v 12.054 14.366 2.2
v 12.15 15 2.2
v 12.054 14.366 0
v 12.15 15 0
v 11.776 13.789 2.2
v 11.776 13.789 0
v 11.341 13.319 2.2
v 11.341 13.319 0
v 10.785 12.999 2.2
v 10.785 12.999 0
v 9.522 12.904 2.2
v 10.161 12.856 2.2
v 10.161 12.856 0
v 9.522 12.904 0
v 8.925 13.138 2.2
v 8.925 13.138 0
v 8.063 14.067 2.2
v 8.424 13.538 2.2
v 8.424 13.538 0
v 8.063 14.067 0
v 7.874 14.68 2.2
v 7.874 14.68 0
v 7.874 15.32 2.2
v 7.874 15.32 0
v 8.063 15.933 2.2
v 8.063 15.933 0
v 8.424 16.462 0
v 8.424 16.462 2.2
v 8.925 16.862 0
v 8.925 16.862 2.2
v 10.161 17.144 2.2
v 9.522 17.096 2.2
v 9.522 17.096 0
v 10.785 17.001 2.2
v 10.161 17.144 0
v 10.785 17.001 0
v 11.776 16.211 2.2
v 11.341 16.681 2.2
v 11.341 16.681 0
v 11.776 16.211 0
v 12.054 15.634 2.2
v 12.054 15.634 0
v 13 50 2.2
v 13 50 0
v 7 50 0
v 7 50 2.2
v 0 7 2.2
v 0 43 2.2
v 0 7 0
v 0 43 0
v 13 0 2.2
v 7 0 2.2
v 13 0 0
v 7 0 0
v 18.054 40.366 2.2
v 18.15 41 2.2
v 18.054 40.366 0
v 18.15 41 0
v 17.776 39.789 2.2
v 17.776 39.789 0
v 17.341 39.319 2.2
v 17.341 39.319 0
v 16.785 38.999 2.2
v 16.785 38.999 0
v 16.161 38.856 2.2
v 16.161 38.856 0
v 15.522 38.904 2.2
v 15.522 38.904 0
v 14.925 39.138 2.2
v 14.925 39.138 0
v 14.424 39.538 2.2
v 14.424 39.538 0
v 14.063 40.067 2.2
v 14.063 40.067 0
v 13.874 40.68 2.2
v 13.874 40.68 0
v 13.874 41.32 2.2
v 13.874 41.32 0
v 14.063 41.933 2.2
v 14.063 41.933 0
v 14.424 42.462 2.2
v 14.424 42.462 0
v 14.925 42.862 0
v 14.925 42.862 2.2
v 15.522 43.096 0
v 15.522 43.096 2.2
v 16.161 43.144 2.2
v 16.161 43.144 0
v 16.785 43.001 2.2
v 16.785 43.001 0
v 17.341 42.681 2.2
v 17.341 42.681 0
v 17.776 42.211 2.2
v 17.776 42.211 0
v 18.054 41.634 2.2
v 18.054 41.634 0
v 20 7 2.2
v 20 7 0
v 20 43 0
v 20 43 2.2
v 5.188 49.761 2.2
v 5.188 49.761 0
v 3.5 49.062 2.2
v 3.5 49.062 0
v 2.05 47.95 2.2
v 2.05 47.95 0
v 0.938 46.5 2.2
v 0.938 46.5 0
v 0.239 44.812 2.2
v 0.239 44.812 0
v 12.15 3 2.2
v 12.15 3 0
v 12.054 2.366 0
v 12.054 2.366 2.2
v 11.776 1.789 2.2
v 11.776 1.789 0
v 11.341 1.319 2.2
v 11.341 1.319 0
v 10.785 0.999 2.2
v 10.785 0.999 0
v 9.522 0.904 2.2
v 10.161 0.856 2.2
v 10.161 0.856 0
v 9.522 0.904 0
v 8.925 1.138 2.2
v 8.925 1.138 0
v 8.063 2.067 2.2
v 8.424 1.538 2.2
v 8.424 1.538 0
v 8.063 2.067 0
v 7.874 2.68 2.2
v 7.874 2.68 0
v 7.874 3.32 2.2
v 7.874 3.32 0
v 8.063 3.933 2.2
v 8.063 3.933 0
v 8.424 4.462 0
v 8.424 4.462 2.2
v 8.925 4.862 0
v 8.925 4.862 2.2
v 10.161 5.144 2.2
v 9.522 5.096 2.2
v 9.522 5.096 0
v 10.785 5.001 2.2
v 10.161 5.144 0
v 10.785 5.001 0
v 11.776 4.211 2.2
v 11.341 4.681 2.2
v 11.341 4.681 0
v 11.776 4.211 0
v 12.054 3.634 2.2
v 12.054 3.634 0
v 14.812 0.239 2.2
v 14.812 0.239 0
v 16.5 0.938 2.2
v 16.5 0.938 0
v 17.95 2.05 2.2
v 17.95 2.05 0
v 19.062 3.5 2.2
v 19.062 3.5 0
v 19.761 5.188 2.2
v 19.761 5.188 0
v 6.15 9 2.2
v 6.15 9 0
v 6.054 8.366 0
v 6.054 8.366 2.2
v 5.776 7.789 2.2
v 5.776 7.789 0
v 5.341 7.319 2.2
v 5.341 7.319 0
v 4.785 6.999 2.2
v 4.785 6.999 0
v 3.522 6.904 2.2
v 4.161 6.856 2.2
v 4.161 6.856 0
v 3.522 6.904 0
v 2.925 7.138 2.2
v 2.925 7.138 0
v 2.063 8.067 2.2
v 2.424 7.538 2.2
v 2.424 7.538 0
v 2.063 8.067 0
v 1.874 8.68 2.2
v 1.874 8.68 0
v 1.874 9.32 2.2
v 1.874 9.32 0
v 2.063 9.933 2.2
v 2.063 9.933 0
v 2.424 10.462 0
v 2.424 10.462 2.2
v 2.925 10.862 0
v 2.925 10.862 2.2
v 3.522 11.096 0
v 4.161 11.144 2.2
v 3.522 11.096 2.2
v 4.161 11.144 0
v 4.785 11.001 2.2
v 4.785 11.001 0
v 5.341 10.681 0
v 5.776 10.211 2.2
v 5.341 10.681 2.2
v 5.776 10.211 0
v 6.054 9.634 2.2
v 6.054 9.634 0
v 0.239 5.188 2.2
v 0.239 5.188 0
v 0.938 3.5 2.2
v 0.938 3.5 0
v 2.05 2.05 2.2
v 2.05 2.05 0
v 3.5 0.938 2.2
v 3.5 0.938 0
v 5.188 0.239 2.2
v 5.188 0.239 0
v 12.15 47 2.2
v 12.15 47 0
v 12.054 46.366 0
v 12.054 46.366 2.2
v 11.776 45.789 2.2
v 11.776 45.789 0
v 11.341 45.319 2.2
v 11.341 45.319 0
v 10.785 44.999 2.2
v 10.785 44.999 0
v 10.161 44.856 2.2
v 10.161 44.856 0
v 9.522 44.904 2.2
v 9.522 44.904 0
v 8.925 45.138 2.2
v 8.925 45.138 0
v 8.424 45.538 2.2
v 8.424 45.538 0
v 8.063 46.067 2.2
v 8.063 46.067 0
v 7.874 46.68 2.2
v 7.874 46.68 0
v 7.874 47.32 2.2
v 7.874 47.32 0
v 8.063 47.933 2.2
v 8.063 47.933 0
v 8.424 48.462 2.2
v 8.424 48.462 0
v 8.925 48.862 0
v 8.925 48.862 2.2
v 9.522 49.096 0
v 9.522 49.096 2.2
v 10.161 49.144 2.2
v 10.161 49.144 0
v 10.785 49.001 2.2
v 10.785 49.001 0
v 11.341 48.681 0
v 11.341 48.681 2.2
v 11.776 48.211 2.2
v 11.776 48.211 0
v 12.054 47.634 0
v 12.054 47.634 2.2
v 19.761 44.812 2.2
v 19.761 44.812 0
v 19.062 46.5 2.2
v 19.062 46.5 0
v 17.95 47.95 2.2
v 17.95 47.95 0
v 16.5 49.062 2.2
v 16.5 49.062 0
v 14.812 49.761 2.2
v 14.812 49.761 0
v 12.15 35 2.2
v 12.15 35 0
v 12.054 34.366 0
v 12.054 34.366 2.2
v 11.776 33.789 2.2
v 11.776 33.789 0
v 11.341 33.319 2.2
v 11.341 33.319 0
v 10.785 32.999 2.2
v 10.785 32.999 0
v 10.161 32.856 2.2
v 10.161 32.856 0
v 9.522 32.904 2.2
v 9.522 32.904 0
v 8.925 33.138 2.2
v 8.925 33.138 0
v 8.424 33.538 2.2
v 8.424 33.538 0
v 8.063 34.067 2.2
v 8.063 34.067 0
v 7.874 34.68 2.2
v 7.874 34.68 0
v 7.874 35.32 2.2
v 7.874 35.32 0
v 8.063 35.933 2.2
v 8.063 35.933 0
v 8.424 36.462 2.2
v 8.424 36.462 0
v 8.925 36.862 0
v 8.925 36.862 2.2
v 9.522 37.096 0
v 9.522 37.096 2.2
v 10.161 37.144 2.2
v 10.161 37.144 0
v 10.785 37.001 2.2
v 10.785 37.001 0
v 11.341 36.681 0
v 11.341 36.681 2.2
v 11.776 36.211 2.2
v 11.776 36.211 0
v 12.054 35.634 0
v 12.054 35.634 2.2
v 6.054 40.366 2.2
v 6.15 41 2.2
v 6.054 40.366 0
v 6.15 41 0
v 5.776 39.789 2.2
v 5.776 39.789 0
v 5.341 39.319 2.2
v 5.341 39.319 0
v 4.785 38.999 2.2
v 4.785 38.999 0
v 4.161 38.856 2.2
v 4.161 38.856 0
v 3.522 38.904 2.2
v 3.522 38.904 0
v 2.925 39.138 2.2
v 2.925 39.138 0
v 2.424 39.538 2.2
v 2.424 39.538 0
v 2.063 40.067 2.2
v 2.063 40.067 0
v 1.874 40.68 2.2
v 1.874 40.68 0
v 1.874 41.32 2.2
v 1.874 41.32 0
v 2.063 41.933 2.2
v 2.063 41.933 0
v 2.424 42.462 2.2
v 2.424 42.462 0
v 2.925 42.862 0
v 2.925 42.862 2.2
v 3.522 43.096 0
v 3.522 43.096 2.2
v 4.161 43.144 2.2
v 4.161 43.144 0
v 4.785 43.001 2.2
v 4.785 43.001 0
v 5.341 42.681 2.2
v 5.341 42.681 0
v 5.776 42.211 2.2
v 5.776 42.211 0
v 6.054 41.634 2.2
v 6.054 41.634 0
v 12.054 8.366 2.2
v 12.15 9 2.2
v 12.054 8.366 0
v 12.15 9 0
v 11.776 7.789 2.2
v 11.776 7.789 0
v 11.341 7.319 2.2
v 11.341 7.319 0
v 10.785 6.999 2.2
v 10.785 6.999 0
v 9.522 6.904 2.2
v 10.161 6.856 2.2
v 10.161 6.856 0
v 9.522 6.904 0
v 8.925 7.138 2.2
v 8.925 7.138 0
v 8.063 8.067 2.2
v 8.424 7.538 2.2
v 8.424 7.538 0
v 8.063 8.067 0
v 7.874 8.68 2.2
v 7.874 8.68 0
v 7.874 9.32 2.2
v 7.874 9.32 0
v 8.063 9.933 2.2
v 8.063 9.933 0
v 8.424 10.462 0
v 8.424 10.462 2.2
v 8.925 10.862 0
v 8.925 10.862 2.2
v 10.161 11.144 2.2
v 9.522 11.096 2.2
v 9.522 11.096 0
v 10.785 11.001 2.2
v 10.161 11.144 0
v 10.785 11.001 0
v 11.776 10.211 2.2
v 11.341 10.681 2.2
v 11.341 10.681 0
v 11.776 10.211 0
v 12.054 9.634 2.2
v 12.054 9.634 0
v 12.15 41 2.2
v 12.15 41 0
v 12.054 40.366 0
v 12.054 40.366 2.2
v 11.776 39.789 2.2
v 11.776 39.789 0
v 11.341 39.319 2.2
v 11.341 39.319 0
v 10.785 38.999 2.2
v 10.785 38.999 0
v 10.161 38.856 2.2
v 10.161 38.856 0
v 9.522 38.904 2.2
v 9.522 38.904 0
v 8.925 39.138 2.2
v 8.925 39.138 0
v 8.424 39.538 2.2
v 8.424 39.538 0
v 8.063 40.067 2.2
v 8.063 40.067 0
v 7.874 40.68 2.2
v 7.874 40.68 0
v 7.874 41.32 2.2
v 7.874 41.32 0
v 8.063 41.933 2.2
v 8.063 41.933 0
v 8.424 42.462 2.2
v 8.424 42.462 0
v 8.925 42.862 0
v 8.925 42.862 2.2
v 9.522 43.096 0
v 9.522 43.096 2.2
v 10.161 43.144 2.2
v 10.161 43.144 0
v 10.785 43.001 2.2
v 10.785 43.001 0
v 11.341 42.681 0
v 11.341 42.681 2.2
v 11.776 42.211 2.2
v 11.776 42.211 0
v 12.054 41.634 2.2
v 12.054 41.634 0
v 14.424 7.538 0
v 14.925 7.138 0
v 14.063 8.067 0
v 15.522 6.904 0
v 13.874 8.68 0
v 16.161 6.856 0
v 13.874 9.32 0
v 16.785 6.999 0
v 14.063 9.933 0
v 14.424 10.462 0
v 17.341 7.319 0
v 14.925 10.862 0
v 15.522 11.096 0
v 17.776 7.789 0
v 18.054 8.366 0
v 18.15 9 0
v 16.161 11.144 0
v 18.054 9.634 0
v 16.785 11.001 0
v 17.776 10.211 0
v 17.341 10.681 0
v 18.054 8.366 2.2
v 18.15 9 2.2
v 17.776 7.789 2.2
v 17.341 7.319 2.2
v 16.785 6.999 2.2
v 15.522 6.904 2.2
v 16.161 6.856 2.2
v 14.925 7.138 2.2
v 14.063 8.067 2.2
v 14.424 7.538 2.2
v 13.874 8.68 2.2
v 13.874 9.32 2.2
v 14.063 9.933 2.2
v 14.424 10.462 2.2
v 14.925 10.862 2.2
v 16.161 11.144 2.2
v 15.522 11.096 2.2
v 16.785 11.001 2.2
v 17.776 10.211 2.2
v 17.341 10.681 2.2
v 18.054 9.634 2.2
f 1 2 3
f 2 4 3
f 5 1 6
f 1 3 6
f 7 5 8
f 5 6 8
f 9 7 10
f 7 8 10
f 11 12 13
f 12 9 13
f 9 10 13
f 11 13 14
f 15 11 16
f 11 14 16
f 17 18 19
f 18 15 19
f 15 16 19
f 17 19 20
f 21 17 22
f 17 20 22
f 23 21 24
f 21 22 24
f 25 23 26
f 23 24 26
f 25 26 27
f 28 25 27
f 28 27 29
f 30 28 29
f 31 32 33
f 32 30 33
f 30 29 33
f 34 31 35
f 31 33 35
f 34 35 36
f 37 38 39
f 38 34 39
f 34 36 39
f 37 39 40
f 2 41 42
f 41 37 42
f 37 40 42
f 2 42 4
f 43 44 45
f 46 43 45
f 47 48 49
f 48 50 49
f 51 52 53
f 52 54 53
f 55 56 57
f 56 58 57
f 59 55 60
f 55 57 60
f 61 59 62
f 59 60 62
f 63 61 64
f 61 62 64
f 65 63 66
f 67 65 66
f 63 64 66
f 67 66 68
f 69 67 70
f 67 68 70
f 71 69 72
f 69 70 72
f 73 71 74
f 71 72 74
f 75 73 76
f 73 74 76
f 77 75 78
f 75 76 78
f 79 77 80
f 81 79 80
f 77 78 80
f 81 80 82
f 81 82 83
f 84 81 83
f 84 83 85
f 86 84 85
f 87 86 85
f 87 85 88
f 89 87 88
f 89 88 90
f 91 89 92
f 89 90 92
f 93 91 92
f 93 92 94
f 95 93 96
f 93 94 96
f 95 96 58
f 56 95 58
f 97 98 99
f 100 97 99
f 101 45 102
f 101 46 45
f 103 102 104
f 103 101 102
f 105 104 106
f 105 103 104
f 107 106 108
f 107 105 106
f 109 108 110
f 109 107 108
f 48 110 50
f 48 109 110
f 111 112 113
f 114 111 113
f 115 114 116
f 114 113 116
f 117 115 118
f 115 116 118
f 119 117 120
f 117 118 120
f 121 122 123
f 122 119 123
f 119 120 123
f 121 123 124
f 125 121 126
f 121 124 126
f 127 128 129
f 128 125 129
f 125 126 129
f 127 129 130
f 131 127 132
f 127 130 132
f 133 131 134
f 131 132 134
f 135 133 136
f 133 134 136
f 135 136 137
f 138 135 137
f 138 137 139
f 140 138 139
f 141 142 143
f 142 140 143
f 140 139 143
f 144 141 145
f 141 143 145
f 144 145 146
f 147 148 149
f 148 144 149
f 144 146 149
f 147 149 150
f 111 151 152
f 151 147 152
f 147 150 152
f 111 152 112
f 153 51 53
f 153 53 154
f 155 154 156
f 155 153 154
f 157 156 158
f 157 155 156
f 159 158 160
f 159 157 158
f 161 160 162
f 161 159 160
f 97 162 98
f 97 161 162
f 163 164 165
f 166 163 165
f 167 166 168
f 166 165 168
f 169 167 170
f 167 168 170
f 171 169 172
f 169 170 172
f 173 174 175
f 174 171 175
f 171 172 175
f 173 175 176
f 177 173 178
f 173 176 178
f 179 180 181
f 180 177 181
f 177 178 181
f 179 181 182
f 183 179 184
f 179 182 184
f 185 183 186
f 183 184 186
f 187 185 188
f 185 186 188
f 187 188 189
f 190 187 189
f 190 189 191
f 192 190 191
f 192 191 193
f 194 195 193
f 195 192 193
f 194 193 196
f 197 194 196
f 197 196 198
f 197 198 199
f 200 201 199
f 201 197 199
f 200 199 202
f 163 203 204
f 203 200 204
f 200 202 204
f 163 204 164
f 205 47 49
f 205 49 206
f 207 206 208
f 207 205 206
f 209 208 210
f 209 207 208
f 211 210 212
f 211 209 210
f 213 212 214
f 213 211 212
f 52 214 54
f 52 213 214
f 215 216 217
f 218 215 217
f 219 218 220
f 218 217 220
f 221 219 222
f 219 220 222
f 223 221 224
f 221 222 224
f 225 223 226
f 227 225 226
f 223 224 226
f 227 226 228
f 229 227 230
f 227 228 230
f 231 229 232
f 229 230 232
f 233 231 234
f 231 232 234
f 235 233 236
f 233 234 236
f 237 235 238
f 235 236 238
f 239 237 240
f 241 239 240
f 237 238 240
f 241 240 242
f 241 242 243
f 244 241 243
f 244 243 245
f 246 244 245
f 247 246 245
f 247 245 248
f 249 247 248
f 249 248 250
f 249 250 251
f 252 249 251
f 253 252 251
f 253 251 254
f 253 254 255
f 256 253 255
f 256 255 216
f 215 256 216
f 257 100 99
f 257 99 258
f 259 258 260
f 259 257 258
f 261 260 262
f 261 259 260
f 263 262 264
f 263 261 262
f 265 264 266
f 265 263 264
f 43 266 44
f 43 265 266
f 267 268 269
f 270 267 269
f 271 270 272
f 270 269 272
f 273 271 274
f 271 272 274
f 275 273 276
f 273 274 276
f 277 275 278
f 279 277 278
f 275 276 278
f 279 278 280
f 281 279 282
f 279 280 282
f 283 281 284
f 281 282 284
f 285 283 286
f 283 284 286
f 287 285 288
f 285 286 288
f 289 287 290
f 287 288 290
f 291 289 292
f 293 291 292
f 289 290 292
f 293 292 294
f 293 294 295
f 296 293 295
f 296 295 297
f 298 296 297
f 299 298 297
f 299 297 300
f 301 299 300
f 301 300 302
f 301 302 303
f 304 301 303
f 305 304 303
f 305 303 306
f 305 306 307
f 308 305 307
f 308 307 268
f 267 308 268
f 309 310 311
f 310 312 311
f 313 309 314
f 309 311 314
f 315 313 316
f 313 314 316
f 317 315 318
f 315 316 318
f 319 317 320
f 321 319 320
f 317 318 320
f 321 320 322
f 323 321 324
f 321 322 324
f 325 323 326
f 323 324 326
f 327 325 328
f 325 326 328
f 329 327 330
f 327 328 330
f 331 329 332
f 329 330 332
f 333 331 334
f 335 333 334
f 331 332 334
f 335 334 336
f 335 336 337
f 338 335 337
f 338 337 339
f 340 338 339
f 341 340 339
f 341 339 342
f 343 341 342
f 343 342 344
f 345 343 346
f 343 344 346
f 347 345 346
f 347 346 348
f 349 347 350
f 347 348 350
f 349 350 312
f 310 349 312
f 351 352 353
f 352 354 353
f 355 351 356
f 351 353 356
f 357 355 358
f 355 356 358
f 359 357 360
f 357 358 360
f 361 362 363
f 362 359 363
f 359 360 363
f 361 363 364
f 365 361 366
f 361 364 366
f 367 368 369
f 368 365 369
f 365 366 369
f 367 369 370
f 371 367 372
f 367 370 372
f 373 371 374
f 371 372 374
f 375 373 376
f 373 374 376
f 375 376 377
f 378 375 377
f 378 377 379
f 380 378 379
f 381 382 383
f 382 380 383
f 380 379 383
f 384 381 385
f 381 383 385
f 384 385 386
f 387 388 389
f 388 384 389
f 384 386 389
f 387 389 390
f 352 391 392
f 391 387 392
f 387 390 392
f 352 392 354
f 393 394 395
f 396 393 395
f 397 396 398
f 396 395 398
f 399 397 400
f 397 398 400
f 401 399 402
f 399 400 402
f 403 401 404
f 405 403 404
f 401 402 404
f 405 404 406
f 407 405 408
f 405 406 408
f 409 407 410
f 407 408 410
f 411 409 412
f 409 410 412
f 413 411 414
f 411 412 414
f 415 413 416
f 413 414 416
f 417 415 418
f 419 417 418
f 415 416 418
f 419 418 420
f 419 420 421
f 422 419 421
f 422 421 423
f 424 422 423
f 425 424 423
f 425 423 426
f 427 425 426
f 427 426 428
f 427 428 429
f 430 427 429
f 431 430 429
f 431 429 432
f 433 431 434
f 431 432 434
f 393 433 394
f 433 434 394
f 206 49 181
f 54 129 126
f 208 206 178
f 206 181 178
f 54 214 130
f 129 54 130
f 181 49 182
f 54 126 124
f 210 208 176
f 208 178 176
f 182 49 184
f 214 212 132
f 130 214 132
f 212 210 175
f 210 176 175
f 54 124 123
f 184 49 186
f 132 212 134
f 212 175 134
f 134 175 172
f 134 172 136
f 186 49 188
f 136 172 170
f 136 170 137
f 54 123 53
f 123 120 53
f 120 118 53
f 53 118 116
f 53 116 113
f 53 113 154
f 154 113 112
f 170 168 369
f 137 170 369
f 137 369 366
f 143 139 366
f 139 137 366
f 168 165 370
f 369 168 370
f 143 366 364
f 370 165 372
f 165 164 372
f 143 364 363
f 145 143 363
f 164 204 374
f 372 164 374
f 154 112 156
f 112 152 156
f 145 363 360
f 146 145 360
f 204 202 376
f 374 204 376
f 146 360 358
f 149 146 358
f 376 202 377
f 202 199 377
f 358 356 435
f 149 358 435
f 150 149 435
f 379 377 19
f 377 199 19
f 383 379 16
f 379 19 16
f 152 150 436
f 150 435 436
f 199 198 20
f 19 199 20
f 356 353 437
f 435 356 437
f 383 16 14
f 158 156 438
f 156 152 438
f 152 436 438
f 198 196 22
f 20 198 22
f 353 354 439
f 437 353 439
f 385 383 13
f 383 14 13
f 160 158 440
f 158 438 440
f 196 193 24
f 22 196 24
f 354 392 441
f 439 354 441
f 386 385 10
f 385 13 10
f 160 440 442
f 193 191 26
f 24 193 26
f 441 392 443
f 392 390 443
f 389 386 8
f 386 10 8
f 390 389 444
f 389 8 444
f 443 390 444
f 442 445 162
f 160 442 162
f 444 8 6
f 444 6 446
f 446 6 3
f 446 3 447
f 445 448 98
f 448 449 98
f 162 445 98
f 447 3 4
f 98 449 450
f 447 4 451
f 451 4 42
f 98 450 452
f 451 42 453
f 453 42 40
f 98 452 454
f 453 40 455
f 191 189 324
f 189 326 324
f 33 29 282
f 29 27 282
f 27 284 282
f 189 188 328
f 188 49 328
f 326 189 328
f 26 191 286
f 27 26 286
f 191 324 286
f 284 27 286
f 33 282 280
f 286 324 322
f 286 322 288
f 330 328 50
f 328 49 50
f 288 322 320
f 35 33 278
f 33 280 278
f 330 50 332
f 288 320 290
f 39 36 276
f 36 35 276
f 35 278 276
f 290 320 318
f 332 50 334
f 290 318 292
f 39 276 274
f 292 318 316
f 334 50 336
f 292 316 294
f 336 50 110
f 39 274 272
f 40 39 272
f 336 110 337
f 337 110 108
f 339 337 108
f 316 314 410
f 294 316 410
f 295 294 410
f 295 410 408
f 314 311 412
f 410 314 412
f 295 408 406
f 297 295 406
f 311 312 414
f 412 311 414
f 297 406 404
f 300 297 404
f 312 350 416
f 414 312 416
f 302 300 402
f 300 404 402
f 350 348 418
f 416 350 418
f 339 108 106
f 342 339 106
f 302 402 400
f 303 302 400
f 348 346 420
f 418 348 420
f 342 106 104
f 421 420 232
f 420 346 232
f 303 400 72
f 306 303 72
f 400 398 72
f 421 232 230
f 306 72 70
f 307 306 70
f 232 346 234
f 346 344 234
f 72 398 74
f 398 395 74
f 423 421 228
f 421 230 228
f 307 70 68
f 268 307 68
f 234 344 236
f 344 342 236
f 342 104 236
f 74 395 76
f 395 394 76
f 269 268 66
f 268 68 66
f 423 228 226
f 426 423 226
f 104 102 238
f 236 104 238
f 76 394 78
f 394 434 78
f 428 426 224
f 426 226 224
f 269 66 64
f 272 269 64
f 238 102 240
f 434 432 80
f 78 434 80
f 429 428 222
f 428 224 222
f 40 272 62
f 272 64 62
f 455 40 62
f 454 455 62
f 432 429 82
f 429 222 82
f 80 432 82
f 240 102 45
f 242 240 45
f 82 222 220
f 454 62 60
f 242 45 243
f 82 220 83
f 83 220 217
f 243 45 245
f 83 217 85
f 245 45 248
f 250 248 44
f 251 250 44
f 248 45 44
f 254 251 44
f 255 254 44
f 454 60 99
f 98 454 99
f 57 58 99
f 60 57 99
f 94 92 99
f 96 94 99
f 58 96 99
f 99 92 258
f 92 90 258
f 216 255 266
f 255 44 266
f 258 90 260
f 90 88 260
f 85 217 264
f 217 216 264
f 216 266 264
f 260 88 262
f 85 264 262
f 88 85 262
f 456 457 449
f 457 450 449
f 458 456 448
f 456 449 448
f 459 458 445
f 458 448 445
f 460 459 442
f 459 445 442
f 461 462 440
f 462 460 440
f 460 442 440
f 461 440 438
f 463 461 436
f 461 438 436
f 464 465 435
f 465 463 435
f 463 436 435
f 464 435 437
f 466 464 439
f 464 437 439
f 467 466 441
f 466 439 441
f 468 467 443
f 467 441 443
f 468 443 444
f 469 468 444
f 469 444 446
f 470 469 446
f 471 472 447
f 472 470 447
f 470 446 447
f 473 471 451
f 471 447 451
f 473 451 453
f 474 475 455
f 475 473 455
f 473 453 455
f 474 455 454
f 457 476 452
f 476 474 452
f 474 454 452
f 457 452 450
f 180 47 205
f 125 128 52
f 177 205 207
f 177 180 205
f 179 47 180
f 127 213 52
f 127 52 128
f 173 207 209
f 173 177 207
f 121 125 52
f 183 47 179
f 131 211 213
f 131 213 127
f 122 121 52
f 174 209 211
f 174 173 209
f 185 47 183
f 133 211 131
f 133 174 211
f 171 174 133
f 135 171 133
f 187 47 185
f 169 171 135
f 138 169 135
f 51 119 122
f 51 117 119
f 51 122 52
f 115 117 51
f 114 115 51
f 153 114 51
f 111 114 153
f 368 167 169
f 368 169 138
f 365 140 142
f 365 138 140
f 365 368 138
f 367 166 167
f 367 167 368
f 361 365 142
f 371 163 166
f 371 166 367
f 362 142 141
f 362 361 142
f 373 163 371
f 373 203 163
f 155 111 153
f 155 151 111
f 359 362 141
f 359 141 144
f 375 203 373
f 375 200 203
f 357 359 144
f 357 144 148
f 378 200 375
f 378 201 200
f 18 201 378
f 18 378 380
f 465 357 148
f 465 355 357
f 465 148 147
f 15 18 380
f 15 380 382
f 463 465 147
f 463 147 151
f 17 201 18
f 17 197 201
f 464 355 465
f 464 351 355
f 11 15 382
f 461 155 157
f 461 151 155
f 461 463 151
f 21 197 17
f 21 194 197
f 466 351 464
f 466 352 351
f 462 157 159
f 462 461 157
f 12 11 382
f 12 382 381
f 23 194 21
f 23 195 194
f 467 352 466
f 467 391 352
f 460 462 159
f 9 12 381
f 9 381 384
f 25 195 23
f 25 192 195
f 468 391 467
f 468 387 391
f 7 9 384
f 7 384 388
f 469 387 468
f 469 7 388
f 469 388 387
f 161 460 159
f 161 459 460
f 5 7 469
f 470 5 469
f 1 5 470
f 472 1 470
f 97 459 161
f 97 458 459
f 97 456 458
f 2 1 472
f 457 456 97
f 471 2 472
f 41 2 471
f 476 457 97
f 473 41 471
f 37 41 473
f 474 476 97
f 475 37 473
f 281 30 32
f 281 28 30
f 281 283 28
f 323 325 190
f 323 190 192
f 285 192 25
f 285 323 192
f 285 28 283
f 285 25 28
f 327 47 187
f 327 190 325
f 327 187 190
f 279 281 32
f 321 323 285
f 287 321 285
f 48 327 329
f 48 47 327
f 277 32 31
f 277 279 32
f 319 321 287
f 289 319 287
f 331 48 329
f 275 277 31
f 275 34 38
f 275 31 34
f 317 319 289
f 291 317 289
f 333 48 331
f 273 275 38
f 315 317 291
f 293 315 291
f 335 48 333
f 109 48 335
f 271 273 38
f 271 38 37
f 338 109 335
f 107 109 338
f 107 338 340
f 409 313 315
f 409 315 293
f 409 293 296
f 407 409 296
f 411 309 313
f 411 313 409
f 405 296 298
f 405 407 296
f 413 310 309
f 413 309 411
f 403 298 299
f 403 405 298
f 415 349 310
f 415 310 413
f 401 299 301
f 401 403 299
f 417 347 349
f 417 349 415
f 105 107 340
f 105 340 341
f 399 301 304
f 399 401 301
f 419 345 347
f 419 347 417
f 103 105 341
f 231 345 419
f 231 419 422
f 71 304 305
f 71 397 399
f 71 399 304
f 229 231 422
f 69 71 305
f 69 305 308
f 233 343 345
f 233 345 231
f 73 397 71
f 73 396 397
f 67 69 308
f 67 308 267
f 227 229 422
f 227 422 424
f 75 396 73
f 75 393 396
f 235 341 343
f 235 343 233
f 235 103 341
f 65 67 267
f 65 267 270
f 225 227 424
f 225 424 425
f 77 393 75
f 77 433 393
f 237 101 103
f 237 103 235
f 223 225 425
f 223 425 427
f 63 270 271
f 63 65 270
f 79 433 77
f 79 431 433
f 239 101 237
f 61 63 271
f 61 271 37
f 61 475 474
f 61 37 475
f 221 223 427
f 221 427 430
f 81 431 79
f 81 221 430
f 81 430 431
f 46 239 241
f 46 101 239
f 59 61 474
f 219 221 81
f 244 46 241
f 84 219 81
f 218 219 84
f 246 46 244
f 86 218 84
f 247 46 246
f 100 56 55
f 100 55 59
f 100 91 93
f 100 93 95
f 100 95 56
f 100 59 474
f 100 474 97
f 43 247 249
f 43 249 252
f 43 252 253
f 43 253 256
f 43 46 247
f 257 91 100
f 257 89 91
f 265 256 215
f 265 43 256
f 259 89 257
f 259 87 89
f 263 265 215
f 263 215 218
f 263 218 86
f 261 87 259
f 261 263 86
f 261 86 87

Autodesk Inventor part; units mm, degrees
ref_plane "YZ Plane" through (0, 0, 0) normal (1, 0, 0) x (0, 1, 0)
ref_plane "XZ Plane" through (0, 0, 0) normal (0, 1, 0) x (-1, 0, 0)
ref_plane "XY Plane" through (0, 0, 0) normal (0, 0, 1) x (1, 0, 0)
sketch "Esquisse5" plane through (0, 0, 0) normal (0, 0, 1) x (1, 0, 0)
  line L0 (0, 0) -> (20, 0)
  line L1 (20, 0) -> (20, 25)
  line L2 (20, 25) -> (0, 25)
  line L3 (0, 25) -> (0, 0)
  line L4 (10, 0) -> (10, 25) construction
  circle A0 centre (10, 3) radius 2.15
  circle A1 centre (10, 9) radius 2.15
  circle A2 centre (10, 15) radius 2.15
  line L5 (10, 9) -> (20, 9) construction
  circle A3 centre (16, 9) radius 2.15
  circle A4 centre (4, 9) radius 2.15
  circle A5 centre (10, 9) radius 2.15
  dimension "d61" = 20
  dimension "d62" = 25
  dimension "d63" = 3
  dimension "d64" = 4.3
  dimension "d67" = 6
  dimension "d74" = 6
  dimension "d77" = 6
extrude "Extrusion5" add sketch "Esquisse5" along normal blind 2.2
fillet "Congé4" radius 7 2 edges at (0, 0, 1.1) (20, 0, 1.1)
mirror "Symétrie1" about plane through (20, 25, 0) normal (0, 1, 0)
equation "\"d64\" = Holes"
equation "\"d80\" = Depth"
equation "\"d100\" = Rounding"
equation "\"Depth\" = 2.2"
equation "\"Holes\" = 4.3"
equation "\"Height\" = 0"
equation "\"Rounding\" = 7"
properties part number "ArmToArm"
